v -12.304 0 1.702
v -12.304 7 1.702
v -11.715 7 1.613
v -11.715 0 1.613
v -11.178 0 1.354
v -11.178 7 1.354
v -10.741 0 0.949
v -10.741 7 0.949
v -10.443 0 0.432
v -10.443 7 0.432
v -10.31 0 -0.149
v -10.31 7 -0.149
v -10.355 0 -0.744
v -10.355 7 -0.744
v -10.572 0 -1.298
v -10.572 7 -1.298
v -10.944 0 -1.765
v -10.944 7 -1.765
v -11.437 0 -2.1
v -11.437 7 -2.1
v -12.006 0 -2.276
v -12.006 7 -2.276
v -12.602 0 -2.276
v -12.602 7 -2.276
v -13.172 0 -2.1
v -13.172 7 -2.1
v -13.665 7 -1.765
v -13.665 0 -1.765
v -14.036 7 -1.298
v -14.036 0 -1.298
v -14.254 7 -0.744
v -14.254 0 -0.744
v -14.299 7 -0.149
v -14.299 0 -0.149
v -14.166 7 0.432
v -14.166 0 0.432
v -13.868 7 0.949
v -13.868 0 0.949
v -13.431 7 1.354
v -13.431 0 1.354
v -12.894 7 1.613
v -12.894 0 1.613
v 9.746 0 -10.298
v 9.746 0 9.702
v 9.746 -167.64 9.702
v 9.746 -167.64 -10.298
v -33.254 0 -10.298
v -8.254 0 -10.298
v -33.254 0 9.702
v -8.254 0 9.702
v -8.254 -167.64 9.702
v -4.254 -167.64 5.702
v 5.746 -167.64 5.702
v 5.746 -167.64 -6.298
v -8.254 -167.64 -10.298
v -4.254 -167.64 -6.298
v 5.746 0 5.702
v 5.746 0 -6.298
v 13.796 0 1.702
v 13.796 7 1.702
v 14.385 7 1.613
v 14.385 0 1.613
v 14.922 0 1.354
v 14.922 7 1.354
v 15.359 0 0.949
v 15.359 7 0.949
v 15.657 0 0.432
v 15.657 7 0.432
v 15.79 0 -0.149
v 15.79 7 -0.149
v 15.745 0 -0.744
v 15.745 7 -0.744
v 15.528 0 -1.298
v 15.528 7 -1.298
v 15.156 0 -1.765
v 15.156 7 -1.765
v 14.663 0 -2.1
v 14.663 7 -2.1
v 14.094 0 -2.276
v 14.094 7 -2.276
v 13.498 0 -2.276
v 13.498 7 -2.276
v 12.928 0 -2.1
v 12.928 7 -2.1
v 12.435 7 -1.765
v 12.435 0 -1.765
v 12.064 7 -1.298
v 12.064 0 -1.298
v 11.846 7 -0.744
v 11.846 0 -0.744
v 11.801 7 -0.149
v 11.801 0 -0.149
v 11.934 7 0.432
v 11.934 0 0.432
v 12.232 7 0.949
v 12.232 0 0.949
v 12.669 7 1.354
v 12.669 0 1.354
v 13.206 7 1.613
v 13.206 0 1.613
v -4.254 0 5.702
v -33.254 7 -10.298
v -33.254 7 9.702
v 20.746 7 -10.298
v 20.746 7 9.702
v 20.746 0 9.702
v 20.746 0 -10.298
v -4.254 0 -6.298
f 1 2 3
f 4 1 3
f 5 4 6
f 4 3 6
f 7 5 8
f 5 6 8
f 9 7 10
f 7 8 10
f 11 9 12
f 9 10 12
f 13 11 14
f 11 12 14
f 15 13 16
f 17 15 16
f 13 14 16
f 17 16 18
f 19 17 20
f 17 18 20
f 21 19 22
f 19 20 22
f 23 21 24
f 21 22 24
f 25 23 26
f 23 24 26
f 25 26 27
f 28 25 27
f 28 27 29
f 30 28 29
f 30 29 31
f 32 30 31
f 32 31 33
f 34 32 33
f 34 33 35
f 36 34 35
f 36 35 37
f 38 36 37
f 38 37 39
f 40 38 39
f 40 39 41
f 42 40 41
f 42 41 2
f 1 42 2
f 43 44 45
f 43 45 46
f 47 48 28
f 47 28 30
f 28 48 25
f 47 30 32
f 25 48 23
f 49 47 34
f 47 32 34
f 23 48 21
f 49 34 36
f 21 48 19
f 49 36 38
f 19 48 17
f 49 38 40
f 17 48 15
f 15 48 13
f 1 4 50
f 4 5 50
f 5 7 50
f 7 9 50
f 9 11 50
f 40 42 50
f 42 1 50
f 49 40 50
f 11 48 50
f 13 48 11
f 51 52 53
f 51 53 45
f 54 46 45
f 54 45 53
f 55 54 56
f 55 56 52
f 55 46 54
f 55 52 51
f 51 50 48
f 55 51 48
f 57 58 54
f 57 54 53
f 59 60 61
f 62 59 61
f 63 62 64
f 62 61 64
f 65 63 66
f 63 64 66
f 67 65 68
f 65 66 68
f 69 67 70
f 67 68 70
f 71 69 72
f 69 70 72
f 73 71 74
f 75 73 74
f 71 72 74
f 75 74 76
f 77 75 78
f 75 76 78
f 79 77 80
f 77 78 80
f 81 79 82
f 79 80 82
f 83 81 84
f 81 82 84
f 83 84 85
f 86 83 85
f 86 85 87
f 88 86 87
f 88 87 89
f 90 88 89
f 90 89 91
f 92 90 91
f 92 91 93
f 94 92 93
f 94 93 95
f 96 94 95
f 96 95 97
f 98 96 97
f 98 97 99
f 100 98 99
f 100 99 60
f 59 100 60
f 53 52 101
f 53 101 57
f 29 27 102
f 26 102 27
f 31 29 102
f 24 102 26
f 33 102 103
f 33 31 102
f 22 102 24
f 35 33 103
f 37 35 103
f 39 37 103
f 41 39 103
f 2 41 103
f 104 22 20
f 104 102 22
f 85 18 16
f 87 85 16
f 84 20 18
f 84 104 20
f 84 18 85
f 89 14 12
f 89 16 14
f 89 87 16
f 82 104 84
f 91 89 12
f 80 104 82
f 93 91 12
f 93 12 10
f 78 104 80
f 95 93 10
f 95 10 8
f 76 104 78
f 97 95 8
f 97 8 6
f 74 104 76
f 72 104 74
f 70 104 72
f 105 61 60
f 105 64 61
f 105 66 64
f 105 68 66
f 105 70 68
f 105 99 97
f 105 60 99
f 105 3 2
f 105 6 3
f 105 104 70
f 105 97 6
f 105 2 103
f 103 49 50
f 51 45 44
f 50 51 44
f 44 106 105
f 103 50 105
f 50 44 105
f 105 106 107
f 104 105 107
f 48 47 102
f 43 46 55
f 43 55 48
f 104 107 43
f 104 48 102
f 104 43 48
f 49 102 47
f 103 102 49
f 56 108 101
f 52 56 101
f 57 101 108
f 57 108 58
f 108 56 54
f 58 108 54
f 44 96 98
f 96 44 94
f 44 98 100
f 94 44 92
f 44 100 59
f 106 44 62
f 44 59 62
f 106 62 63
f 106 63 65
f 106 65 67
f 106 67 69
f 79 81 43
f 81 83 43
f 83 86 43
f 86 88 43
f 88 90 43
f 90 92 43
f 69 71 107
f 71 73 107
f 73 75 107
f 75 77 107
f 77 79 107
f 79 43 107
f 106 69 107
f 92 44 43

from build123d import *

# Parameters (mm, degrees)
SKETCH1_W           = 40
SKETCH1_H           = 20
BOSS_EXTRUDE1_DEPTH = 7
SKETCH2_R           = 2
CUT_EXTRUDE1_DEPTH  = 25.19584861
SKETCH3_W           = 18
SKETCH3_H           = 20
BOSS_EXTRUDE2_DEPTH = 167.64
SKETCH4_W           = 10
SKETCH4_H           = 12
CUT_EXTRUDE2_DEPTH  = 167.64
SKETCH7_W           = 20
SKETCH7_H           = 7
BOSS_EXTRUDE3_DEPTH = 14


with BuildPart() as part:
    # Sketch1 → Boss-Extrude1 (new body)
    with BuildSketch(Plane(origin=(0, 0, 0), x_dir=(1, 0, 0), z_dir=(0, 1, 0))):
        with Locations((0.745622296, 0.298458403)):
            Rectangle(SKETCH1_W, SKETCH1_H)
    extrude(amount=BOSS_EXTRUDE1_DEPTH)

    # Sketch2 → Cut-Extrude1 (cut, through all)
    with BuildSketch(Plane(origin=(0, 7, 0), x_dir=(1, 0, 0), z_dir=(0, 1, 0))):
        with Locations(Location((-12.304377704, 0.298458403, 0), (0, 0, 270))):
            Circle(SKETCH2_R)
        with Locations(Location((13.795622296, 0.298458403, 0), (0, 0, 270))):
            Circle(SKETCH2_R)
    extrude(amount=-CUT_EXTRUDE1_DEPTH, mode=Mode.SUBTRACT)

    # Sketch3 → Boss-Extrude2 (add)
    with BuildSketch(Plane(origin=(0, 0, 0), x_dir=(-1, 0, 0), z_dir=(0, -1, 0))):
        with Locations((-0.745622296, 0.298458403)):
            Rectangle(SKETCH3_W, SKETCH3_H)
    extrude(amount=BOSS_EXTRUDE2_DEPTH)

    # Sketch4 → Cut-Extrude2 (cut)
    with BuildSketch(Plane.XZ.offset(167.64)):
        with Locations((0.745622296, -0.298458403)):
            Rectangle(SKETCH4_W, SKETCH4_H)
    extrude(amount=-CUT_EXTRUDE2_DEPTH, mode=Mode.SUBTRACT)

    # Sketch7 → Boss-Extrude3 (add)
    with BuildSketch(Plane.ZY.offset(19.254377704)):
        with Locations((-0.298458403, 3.5)):
            Rectangle(SKETCH7_W, SKETCH7_H)
    extrude(amount=BOSS_EXTRUDE3_DEPTH)


solid = part.part
